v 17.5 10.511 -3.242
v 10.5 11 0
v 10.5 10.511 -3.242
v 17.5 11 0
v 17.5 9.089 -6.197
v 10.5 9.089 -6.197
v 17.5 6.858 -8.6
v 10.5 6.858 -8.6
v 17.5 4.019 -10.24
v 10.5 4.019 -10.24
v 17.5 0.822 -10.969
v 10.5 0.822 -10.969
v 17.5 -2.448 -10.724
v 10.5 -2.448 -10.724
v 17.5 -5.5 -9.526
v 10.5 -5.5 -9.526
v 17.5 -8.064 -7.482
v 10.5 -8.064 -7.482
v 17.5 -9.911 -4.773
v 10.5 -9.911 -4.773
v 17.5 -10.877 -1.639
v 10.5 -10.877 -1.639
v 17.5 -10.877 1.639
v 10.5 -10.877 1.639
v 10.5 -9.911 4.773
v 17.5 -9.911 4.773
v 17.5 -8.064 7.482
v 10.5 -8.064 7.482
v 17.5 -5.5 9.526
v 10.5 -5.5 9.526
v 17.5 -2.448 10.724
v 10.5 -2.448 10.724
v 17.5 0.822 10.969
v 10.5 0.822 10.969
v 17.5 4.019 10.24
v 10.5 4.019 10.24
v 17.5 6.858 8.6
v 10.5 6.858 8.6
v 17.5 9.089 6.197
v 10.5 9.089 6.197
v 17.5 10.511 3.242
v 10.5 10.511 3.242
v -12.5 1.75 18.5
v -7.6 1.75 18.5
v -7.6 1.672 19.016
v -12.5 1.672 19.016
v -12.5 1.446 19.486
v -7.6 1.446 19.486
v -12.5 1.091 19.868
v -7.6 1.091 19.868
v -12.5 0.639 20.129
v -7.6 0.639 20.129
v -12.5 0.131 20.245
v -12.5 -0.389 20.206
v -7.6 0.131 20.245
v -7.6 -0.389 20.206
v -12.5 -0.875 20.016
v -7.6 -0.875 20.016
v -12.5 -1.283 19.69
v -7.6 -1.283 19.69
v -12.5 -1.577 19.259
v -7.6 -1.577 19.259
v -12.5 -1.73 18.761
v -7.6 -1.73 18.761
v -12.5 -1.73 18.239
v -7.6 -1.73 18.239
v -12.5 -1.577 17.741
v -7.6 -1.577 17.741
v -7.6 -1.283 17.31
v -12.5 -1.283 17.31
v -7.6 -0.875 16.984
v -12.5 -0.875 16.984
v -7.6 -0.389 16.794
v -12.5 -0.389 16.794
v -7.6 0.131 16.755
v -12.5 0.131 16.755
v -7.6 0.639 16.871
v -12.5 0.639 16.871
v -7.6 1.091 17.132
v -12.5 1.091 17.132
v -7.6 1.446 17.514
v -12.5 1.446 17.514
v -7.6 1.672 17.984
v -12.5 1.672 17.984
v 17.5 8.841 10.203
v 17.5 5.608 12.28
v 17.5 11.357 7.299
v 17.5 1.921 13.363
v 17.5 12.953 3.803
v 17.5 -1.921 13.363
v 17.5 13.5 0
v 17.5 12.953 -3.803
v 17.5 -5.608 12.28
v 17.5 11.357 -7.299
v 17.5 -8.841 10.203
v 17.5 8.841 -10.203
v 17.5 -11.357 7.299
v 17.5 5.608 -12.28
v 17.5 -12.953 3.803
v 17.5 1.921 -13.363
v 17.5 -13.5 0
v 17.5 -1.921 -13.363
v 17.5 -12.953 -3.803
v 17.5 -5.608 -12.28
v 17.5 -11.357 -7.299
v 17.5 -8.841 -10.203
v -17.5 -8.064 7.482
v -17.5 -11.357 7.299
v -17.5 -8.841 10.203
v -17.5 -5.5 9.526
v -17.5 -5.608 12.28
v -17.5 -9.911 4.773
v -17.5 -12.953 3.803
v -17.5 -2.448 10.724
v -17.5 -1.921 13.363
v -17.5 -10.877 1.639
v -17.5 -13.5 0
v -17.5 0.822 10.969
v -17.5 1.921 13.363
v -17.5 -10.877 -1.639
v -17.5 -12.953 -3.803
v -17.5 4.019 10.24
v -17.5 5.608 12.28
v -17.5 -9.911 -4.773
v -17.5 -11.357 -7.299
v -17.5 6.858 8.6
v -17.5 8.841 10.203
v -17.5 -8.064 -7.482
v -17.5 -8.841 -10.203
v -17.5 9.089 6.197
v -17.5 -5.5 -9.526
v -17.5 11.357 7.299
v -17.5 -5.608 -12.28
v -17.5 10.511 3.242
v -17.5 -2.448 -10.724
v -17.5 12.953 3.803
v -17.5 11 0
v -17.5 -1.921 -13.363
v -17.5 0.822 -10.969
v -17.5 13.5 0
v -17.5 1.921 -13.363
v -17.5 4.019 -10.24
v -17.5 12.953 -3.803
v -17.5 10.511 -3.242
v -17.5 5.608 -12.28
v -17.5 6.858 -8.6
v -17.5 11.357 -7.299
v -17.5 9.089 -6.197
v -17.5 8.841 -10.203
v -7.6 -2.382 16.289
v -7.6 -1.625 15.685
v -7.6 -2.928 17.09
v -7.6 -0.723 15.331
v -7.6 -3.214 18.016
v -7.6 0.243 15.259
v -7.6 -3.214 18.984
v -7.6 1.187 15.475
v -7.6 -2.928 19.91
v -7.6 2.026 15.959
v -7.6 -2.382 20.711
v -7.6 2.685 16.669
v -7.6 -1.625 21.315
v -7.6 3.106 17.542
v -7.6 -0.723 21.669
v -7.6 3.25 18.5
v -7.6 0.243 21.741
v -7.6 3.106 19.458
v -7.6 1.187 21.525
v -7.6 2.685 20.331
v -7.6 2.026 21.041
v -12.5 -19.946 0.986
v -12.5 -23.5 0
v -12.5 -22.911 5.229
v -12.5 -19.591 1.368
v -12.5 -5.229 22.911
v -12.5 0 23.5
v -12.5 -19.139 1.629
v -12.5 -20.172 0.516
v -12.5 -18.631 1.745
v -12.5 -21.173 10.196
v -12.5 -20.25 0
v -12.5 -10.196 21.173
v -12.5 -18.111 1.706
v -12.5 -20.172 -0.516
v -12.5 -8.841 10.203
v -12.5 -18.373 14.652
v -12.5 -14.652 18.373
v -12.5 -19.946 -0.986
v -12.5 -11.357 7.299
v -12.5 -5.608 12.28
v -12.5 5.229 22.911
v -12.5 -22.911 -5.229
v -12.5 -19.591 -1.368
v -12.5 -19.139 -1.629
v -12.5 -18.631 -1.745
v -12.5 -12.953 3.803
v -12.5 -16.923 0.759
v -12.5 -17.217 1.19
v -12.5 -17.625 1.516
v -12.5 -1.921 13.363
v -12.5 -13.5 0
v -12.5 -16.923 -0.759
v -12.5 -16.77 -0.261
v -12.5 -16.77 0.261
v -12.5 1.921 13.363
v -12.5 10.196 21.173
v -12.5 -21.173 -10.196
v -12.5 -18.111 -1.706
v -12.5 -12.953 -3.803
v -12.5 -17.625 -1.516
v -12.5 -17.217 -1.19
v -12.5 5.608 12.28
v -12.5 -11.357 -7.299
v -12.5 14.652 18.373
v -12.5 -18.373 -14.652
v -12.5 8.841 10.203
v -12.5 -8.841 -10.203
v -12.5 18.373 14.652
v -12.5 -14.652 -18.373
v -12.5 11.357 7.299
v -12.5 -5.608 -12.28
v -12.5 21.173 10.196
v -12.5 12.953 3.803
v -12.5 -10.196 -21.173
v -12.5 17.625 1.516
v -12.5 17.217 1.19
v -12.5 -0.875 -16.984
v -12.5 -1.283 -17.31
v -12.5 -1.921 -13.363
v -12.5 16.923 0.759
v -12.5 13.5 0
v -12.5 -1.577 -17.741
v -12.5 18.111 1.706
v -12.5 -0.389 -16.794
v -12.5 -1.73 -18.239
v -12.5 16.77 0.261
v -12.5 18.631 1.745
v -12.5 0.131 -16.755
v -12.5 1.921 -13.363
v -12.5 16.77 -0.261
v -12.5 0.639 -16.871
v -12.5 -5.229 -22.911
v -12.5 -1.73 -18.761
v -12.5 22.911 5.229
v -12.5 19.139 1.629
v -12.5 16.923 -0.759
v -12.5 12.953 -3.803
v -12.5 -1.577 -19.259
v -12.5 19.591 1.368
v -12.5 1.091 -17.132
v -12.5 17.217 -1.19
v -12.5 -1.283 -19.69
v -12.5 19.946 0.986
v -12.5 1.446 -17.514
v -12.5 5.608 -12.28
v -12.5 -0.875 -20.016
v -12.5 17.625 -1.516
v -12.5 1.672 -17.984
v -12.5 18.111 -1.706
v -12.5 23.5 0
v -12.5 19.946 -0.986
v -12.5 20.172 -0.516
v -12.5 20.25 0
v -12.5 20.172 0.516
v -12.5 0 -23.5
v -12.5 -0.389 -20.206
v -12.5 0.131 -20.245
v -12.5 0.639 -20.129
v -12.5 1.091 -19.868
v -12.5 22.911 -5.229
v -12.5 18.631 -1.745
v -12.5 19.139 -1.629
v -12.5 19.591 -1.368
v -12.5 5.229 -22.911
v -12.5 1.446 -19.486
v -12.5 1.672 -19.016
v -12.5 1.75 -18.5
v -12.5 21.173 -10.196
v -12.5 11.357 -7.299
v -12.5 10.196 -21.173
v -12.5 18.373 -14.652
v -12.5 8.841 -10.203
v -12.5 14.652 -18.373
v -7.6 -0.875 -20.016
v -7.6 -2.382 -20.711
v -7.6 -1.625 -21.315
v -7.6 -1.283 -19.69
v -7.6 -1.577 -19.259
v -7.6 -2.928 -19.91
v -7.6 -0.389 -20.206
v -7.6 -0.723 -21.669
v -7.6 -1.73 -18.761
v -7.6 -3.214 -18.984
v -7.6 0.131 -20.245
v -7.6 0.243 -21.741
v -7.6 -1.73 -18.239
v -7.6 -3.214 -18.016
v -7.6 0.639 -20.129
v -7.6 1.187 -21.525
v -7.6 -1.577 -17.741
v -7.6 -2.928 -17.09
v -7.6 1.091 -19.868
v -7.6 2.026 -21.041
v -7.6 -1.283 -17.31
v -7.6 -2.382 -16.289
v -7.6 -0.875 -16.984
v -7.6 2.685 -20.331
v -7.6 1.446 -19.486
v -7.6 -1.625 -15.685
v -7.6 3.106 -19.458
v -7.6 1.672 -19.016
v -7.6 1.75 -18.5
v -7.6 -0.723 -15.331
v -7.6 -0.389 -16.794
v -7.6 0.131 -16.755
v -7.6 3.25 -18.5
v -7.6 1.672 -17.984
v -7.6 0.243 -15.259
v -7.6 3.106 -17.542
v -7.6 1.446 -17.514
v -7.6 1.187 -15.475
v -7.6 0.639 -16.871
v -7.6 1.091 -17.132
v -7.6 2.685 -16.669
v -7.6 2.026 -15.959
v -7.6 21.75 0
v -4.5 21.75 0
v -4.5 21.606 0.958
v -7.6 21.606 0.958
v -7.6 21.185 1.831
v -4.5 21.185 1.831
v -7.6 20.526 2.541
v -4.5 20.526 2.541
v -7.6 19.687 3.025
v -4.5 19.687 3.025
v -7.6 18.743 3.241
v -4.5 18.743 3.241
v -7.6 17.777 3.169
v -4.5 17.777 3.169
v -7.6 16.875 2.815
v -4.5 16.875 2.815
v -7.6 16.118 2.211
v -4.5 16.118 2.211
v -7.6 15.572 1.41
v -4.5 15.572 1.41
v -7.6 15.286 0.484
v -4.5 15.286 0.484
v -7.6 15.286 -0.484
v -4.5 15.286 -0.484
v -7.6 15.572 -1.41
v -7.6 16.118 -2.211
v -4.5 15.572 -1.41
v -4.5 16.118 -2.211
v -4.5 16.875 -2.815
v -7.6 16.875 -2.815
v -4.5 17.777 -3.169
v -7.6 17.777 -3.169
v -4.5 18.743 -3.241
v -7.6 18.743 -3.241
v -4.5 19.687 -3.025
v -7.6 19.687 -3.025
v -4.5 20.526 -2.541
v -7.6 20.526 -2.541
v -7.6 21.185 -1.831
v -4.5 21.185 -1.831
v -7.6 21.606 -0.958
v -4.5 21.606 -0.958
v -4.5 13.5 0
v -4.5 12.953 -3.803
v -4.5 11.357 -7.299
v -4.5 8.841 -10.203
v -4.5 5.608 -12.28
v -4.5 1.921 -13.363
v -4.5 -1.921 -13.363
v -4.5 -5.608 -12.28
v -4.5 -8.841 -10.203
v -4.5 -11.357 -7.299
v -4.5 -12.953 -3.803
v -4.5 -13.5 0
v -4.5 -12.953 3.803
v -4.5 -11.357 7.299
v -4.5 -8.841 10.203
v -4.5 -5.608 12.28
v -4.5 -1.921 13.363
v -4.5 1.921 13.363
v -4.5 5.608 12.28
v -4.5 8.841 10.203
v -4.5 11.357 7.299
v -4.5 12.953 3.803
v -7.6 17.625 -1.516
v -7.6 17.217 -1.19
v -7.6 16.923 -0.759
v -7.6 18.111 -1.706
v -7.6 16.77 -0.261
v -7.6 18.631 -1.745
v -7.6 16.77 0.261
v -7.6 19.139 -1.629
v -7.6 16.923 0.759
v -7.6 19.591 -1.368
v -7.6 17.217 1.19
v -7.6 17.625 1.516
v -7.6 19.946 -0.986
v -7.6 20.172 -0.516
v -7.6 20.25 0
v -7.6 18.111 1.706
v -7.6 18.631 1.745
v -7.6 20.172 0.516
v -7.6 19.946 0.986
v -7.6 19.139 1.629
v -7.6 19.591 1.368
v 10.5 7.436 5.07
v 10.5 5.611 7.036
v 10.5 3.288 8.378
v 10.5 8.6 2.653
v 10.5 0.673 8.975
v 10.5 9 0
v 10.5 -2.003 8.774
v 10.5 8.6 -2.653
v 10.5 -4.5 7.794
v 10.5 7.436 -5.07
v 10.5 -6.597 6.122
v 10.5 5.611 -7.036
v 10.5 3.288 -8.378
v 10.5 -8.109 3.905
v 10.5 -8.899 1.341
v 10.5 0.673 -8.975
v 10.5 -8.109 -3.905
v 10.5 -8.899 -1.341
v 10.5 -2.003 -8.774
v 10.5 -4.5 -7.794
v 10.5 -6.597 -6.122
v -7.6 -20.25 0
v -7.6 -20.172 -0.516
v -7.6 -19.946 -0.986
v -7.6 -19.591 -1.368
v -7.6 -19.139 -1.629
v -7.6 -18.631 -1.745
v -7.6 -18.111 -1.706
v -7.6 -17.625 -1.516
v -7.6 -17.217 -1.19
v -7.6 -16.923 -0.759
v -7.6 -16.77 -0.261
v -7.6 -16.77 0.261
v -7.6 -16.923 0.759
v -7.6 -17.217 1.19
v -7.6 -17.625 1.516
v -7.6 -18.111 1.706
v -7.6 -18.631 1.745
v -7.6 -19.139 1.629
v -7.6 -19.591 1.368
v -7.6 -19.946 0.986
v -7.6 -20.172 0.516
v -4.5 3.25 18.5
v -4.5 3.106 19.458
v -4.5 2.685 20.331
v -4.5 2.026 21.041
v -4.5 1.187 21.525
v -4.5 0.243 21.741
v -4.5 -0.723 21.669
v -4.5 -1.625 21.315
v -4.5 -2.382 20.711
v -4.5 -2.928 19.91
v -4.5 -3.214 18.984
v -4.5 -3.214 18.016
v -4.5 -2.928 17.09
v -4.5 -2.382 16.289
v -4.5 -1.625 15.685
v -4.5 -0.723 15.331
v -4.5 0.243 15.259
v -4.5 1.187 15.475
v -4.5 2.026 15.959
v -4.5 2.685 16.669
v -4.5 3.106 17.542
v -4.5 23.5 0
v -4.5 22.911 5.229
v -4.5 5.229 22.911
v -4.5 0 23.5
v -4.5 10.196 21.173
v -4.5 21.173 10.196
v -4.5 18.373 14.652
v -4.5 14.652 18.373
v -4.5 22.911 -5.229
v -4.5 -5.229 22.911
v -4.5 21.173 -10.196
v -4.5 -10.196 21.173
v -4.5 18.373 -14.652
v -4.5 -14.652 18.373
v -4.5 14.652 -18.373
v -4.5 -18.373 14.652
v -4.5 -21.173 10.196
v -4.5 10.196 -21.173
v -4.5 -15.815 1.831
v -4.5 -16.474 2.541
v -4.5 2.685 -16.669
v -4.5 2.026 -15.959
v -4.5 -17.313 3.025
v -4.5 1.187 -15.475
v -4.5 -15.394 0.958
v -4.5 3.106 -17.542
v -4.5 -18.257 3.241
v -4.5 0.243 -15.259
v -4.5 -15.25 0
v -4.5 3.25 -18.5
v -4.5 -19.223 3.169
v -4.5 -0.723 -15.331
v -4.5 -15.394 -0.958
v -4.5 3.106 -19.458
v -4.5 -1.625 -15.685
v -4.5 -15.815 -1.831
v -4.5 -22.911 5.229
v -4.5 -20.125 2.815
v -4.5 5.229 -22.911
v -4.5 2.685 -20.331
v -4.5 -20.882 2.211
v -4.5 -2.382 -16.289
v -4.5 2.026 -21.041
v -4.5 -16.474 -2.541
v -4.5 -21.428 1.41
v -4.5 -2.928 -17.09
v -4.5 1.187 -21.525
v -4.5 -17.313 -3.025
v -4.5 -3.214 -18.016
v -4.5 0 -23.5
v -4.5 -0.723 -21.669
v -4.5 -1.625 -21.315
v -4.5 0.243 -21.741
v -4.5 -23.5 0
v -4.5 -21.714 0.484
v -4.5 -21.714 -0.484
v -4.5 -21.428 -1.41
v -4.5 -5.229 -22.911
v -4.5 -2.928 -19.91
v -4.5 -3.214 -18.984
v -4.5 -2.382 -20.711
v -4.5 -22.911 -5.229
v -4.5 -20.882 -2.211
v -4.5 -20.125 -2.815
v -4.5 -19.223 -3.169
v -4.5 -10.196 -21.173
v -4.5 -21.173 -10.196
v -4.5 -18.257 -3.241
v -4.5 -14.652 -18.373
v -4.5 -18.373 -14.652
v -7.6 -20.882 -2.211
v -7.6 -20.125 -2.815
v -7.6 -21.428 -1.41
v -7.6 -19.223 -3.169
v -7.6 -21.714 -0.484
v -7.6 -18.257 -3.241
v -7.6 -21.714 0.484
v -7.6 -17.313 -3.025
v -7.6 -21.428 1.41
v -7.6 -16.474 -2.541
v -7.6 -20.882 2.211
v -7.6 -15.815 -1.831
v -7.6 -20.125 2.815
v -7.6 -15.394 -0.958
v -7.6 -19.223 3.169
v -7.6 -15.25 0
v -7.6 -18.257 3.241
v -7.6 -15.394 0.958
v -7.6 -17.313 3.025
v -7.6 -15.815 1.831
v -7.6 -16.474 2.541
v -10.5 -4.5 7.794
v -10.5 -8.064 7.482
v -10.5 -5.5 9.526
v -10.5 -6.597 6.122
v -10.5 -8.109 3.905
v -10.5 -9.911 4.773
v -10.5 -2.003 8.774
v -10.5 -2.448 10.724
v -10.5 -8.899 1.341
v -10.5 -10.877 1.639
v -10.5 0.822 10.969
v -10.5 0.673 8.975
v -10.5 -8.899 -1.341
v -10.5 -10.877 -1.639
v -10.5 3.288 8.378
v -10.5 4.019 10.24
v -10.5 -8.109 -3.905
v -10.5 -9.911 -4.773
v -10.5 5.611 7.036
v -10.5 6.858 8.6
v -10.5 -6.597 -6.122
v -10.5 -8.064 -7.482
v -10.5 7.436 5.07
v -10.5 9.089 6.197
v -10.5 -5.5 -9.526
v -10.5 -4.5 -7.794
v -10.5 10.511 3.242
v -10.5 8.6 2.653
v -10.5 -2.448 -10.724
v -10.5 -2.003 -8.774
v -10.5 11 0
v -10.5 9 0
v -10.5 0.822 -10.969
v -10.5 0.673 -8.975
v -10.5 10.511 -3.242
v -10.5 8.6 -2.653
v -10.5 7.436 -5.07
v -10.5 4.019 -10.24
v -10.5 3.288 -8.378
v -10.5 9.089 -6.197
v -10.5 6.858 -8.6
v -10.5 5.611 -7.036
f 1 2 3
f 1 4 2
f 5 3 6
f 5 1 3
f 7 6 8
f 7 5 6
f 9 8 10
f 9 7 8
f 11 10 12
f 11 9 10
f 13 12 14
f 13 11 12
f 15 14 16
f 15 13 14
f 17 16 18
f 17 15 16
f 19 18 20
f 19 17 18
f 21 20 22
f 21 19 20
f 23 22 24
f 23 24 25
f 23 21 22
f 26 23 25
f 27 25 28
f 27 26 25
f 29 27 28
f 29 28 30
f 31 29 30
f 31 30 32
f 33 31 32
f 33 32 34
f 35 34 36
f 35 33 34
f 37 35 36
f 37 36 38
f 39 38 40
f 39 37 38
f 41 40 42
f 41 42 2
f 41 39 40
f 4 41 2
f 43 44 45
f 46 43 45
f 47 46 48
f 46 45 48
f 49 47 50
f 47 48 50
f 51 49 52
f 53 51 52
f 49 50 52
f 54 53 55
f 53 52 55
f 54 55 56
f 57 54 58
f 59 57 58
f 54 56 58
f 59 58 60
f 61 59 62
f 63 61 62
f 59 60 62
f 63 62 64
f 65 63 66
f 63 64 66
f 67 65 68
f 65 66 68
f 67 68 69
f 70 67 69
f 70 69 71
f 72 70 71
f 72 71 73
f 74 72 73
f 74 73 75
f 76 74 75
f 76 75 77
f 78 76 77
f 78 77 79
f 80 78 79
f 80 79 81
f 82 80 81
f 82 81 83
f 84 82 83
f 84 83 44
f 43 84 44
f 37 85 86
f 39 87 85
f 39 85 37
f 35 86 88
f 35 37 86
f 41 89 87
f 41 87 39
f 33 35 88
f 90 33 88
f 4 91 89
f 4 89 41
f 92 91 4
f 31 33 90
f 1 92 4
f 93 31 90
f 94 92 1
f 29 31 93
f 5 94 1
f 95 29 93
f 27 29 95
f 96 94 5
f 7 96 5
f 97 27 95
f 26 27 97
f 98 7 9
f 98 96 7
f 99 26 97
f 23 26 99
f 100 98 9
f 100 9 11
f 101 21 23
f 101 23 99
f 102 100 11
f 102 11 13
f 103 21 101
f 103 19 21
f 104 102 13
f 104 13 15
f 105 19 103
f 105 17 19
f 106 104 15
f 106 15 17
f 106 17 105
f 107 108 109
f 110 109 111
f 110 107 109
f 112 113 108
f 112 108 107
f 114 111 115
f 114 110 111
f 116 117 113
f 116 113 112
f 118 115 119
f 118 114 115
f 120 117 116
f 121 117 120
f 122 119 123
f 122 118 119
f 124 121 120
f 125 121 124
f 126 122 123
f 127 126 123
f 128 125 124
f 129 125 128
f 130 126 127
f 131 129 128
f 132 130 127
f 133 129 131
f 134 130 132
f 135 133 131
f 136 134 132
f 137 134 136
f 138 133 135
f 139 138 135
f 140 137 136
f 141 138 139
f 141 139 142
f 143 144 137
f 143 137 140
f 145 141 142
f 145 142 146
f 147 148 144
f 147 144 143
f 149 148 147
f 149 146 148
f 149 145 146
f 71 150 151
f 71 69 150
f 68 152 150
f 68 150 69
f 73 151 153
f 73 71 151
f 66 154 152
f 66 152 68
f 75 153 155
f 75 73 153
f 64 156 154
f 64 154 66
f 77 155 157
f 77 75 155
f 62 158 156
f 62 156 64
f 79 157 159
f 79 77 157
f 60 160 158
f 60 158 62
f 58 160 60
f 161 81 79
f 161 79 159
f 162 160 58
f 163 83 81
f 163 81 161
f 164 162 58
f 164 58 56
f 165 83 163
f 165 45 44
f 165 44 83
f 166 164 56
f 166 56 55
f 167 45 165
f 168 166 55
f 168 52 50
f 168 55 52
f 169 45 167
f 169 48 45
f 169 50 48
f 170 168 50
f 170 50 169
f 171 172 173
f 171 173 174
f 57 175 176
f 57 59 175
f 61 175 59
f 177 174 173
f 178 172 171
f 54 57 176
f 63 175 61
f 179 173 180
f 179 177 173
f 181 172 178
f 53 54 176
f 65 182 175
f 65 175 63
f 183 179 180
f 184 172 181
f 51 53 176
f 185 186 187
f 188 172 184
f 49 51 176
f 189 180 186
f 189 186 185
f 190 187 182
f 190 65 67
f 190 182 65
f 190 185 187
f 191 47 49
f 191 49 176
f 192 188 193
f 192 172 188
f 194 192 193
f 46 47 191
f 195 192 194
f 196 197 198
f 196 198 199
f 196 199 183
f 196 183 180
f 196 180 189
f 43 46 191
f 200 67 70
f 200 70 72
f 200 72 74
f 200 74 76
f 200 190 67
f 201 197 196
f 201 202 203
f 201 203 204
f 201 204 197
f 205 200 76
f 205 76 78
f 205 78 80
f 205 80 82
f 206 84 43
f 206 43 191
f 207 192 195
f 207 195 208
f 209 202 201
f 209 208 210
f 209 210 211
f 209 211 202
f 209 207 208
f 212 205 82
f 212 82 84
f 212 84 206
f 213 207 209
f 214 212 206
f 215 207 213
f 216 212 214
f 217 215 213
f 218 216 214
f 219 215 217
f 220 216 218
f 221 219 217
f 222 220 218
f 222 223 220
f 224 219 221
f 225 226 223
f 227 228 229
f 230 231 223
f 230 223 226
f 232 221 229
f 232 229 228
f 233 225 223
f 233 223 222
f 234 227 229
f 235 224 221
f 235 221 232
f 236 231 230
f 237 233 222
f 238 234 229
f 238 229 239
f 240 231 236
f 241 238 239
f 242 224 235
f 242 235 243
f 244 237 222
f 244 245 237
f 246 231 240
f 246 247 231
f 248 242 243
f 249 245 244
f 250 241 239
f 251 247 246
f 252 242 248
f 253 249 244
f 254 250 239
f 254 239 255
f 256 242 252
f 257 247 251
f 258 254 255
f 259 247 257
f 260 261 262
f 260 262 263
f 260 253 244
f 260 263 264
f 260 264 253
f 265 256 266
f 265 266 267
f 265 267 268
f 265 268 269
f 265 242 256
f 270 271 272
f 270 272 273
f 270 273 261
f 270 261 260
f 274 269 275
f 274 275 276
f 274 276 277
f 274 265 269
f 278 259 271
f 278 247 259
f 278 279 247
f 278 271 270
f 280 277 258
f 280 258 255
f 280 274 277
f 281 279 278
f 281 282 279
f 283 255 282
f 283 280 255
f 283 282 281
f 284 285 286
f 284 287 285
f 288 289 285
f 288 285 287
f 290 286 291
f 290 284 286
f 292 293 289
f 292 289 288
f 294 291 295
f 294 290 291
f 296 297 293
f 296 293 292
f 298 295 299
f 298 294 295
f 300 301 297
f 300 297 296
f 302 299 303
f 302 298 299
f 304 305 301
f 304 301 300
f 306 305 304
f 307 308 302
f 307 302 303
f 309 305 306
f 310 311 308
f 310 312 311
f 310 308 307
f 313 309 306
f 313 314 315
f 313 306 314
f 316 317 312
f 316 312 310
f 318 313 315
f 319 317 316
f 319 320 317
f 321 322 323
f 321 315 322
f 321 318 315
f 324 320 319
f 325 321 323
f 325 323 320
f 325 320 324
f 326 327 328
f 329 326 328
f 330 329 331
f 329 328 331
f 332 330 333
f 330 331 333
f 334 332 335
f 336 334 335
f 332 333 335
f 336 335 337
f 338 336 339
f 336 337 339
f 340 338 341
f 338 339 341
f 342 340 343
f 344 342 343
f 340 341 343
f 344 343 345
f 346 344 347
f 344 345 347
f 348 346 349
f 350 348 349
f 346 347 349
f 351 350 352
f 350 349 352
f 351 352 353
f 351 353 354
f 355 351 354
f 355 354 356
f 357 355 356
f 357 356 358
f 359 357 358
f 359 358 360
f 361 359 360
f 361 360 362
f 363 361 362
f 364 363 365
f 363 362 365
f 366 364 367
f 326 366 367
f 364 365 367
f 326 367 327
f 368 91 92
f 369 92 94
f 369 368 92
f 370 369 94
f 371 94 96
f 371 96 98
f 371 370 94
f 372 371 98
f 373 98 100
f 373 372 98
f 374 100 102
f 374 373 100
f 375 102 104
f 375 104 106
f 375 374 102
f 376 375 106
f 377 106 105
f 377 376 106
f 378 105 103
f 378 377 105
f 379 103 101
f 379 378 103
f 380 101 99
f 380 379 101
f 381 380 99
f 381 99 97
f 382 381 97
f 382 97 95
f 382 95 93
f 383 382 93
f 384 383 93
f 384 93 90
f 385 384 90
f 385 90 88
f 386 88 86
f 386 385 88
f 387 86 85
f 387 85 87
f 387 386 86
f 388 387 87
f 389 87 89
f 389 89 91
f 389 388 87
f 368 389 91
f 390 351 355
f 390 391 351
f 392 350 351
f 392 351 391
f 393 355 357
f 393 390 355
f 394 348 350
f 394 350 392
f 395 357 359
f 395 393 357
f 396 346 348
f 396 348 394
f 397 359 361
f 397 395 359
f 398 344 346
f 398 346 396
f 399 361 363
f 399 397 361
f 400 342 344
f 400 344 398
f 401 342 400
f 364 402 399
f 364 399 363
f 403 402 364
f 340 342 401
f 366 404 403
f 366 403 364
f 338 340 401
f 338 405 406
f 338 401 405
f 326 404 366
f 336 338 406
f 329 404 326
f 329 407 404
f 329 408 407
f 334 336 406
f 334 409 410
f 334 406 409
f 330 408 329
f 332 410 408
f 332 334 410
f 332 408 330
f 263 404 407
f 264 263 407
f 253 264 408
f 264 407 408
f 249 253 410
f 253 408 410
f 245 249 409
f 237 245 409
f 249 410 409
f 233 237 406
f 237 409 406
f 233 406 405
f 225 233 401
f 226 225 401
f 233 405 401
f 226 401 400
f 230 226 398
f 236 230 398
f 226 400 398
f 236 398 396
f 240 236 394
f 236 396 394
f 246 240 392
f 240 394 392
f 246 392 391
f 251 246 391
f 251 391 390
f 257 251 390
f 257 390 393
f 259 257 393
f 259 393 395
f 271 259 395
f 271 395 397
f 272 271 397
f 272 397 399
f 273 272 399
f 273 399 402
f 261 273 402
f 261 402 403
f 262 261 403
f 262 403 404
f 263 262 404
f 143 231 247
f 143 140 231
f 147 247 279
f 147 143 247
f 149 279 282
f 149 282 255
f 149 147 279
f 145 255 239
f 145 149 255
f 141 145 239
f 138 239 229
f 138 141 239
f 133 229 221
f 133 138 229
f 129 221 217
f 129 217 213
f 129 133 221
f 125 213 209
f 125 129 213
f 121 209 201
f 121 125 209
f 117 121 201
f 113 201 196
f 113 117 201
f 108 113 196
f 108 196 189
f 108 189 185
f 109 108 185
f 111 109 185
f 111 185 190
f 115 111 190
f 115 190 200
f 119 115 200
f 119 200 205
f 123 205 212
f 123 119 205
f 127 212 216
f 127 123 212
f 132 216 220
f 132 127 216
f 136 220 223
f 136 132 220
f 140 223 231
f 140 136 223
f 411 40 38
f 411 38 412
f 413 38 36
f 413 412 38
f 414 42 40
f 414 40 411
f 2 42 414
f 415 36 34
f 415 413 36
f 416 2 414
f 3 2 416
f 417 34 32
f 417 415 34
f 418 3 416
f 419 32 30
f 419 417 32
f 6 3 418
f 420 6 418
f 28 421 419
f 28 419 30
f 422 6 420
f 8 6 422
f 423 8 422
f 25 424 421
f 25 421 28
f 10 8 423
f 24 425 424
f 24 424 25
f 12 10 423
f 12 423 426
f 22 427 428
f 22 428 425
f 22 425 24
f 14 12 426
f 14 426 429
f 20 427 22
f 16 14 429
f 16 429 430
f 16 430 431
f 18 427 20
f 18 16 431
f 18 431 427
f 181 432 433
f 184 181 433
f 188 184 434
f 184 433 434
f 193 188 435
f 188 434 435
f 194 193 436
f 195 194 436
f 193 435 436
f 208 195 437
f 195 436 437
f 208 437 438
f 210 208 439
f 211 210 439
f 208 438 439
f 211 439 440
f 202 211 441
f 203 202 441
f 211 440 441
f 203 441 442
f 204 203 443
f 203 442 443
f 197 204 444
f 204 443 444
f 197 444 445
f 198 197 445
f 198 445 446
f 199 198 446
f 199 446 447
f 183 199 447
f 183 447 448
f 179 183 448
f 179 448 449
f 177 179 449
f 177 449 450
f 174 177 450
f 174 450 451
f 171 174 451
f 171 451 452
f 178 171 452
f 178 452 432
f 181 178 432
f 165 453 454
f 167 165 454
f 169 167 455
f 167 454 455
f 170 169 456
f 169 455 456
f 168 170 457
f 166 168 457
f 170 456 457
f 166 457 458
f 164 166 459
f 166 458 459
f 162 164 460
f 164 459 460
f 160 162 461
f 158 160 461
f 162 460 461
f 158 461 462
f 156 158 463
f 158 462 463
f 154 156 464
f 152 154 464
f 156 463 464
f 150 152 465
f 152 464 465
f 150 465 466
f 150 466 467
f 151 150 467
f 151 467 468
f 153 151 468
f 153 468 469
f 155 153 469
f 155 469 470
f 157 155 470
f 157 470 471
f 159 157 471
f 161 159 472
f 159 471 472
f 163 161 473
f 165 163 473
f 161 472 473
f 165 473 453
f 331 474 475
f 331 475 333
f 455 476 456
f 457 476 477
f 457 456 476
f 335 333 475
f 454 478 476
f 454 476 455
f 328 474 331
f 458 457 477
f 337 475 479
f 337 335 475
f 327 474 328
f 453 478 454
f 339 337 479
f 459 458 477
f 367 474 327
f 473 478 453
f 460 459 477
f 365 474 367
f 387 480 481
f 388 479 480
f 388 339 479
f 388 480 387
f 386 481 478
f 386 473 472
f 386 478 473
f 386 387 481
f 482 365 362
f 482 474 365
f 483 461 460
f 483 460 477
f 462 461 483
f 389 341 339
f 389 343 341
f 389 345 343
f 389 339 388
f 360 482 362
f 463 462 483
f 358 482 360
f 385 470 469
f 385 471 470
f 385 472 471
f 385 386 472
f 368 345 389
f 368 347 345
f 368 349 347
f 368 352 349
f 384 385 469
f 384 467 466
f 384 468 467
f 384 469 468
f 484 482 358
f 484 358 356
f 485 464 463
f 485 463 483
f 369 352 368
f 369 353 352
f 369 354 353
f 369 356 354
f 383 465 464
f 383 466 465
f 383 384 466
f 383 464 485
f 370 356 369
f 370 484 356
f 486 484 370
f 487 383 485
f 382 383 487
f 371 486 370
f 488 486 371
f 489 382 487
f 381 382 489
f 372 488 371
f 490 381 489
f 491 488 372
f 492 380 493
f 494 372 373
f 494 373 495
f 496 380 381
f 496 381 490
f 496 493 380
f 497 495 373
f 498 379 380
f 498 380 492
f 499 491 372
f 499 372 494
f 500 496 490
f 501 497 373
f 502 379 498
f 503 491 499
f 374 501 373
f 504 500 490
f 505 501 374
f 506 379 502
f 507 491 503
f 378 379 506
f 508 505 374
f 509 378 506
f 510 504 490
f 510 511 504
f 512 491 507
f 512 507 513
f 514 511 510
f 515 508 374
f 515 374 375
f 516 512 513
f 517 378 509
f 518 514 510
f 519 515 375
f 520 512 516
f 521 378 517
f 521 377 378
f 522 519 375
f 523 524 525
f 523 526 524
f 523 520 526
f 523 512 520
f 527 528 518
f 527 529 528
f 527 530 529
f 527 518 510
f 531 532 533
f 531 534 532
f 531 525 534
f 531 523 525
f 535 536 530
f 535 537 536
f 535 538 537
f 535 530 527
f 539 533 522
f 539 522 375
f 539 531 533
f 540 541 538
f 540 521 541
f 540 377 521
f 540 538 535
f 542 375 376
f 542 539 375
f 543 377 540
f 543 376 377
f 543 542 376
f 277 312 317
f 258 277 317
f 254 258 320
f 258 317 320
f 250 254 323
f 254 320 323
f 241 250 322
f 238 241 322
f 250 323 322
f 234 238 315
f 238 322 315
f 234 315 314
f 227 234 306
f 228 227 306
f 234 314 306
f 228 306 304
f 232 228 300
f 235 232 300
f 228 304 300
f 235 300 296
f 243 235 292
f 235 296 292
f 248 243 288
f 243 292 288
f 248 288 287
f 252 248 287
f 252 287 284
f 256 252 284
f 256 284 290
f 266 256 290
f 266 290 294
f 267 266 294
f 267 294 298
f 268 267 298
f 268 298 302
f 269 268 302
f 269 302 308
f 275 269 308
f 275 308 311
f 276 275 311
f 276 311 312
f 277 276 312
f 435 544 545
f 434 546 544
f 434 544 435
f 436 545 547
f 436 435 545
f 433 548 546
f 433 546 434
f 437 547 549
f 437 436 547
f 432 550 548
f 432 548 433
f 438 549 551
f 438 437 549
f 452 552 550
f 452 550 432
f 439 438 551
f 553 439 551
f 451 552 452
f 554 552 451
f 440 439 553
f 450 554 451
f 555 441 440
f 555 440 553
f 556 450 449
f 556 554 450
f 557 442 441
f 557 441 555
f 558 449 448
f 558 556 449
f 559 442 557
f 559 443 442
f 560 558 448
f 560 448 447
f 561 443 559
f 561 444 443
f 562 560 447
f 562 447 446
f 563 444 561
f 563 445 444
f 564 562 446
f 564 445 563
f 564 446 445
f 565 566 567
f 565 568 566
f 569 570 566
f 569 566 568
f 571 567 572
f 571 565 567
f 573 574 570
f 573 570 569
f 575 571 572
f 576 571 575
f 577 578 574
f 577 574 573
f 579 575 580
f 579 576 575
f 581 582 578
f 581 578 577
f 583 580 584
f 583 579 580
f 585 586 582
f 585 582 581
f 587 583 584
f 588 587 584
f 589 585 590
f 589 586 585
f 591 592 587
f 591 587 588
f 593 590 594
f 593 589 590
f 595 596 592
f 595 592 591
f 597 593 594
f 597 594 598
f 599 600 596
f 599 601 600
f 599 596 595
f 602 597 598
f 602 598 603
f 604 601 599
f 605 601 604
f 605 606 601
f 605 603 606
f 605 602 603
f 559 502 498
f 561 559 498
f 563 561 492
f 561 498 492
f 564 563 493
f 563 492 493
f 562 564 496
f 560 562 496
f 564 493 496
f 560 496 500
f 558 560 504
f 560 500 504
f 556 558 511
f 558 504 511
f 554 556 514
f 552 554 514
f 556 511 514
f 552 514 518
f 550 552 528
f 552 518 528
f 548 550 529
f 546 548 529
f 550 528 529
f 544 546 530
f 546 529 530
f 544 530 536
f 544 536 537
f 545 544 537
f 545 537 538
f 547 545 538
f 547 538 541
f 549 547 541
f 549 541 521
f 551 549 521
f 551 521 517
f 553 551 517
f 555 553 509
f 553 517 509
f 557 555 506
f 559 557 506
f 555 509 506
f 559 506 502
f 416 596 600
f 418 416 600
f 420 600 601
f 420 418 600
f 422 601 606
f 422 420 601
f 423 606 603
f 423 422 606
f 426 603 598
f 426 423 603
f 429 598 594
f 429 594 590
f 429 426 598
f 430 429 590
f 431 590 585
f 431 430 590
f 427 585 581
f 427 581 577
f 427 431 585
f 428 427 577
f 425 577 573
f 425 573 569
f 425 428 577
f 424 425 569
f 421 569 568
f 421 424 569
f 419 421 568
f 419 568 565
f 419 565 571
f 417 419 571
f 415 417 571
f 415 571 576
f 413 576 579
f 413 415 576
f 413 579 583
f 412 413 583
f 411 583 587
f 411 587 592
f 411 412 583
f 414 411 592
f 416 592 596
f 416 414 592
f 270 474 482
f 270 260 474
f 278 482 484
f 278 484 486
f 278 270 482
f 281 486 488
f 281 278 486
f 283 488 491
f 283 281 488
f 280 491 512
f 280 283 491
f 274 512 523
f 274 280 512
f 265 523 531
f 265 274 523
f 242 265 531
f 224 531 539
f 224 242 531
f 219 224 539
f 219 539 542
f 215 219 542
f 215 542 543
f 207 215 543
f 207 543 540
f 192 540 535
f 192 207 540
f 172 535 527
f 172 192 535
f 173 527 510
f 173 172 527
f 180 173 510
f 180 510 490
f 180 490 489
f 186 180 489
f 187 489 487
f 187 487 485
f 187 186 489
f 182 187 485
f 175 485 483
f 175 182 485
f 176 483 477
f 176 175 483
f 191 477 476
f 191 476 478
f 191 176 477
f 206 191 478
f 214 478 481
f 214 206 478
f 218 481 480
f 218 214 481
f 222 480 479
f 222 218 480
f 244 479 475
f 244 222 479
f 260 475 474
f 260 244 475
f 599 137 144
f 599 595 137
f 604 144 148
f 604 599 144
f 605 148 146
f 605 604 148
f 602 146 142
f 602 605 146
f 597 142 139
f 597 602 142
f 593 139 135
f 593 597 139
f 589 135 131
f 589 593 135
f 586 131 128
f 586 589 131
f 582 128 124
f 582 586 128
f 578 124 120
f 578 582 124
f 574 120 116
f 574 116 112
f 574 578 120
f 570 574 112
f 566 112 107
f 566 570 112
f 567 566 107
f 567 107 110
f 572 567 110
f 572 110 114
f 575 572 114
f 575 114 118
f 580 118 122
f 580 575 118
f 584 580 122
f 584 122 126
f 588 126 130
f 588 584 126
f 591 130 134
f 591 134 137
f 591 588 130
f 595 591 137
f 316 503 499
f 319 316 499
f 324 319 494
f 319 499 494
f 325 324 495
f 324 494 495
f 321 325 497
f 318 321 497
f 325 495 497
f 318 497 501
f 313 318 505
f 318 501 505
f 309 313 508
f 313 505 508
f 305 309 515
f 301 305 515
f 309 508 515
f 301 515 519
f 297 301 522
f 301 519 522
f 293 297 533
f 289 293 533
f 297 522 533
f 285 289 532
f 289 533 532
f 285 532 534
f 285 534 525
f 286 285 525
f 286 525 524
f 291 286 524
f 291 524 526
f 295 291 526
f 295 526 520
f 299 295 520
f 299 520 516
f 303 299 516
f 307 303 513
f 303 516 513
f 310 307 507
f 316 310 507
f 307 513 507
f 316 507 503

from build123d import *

# Parameters (mm, degrees)
SKETCH_2_R          = 3.25
CUT_EXTRUDE_1_DEPTH = 3.1
SKETCH_3_R          = 1.75
CUT_EXTRUDE_2_DEPTH = 40.855990767


with BuildPart() as part:
    # 草图1 → 旋转1 (revolve)
    with BuildSketch(Plane.XY):
        Polygon((-17.5, 13.5), (-17.5, 11), (-10.5, 11), (-10.5, 9), (10.5, 9), (10.5, 11), (17.5, 11), (17.5, 13.5), (-4.5, 13.5), (-4.5, 23.5), (-12.5, 23.5), (-12.5, 13.5), align=None)
    revolve(axis=Axis((0, 0, 0), (-1, 0, 0)))

    # 草图2 → 切除-拉伸1 (cut)
    with BuildSketch(Plane(origin=(-4.5, 0, 0), x_dir=(0, 0, -1), z_dir=(1, 0, 0))):
        with Locations(Location((0, 18.5, 0), (0, 0, 90))):
            Circle(SKETCH_2_R)
        with Locations(Location((0, -18.5, 0), (0, 0, 90))):
            Circle(SKETCH_2_R)
        with Locations(Location((18.5, 0, 0), (0, 0, 90))):
            Circle(SKETCH_2_R)
        with Locations(Location((-18.5, 0, 0), (0, 0, 90))):
            Circle(SKETCH_2_R)
    extrude(amount=-CUT_EXTRUDE_1_DEPTH, mode=Mode.SUBTRACT)

    # 草图3 → 切除-拉伸2 (cut, through all)
    with BuildSketch(Plane(origin=(-4.5, 0, 0), x_dir=(0, 0, -1), z_dir=(1, 0, 0))):
        with Locations(Location((0, 18.5, 0), (0, 0, 90))):
            Circle(SKETCH_3_R)
        with Locations(Location((18.5, 0, 0), (0, 0, 90))):
            Circle(SKETCH_3_R)
        with Locations(Location((0, -18.5, 0), (0, 0, 270))):
            Circle(SKETCH_3_R)
        with Locations(Location((-18.5, 0, 0), (0, 0, 90))):
            Circle(SKETCH_3_R)
    extrude(amount=-CUT_EXTRUDE_2_DEPTH, mode=Mode.SUBTRACT)


solid = part.part
